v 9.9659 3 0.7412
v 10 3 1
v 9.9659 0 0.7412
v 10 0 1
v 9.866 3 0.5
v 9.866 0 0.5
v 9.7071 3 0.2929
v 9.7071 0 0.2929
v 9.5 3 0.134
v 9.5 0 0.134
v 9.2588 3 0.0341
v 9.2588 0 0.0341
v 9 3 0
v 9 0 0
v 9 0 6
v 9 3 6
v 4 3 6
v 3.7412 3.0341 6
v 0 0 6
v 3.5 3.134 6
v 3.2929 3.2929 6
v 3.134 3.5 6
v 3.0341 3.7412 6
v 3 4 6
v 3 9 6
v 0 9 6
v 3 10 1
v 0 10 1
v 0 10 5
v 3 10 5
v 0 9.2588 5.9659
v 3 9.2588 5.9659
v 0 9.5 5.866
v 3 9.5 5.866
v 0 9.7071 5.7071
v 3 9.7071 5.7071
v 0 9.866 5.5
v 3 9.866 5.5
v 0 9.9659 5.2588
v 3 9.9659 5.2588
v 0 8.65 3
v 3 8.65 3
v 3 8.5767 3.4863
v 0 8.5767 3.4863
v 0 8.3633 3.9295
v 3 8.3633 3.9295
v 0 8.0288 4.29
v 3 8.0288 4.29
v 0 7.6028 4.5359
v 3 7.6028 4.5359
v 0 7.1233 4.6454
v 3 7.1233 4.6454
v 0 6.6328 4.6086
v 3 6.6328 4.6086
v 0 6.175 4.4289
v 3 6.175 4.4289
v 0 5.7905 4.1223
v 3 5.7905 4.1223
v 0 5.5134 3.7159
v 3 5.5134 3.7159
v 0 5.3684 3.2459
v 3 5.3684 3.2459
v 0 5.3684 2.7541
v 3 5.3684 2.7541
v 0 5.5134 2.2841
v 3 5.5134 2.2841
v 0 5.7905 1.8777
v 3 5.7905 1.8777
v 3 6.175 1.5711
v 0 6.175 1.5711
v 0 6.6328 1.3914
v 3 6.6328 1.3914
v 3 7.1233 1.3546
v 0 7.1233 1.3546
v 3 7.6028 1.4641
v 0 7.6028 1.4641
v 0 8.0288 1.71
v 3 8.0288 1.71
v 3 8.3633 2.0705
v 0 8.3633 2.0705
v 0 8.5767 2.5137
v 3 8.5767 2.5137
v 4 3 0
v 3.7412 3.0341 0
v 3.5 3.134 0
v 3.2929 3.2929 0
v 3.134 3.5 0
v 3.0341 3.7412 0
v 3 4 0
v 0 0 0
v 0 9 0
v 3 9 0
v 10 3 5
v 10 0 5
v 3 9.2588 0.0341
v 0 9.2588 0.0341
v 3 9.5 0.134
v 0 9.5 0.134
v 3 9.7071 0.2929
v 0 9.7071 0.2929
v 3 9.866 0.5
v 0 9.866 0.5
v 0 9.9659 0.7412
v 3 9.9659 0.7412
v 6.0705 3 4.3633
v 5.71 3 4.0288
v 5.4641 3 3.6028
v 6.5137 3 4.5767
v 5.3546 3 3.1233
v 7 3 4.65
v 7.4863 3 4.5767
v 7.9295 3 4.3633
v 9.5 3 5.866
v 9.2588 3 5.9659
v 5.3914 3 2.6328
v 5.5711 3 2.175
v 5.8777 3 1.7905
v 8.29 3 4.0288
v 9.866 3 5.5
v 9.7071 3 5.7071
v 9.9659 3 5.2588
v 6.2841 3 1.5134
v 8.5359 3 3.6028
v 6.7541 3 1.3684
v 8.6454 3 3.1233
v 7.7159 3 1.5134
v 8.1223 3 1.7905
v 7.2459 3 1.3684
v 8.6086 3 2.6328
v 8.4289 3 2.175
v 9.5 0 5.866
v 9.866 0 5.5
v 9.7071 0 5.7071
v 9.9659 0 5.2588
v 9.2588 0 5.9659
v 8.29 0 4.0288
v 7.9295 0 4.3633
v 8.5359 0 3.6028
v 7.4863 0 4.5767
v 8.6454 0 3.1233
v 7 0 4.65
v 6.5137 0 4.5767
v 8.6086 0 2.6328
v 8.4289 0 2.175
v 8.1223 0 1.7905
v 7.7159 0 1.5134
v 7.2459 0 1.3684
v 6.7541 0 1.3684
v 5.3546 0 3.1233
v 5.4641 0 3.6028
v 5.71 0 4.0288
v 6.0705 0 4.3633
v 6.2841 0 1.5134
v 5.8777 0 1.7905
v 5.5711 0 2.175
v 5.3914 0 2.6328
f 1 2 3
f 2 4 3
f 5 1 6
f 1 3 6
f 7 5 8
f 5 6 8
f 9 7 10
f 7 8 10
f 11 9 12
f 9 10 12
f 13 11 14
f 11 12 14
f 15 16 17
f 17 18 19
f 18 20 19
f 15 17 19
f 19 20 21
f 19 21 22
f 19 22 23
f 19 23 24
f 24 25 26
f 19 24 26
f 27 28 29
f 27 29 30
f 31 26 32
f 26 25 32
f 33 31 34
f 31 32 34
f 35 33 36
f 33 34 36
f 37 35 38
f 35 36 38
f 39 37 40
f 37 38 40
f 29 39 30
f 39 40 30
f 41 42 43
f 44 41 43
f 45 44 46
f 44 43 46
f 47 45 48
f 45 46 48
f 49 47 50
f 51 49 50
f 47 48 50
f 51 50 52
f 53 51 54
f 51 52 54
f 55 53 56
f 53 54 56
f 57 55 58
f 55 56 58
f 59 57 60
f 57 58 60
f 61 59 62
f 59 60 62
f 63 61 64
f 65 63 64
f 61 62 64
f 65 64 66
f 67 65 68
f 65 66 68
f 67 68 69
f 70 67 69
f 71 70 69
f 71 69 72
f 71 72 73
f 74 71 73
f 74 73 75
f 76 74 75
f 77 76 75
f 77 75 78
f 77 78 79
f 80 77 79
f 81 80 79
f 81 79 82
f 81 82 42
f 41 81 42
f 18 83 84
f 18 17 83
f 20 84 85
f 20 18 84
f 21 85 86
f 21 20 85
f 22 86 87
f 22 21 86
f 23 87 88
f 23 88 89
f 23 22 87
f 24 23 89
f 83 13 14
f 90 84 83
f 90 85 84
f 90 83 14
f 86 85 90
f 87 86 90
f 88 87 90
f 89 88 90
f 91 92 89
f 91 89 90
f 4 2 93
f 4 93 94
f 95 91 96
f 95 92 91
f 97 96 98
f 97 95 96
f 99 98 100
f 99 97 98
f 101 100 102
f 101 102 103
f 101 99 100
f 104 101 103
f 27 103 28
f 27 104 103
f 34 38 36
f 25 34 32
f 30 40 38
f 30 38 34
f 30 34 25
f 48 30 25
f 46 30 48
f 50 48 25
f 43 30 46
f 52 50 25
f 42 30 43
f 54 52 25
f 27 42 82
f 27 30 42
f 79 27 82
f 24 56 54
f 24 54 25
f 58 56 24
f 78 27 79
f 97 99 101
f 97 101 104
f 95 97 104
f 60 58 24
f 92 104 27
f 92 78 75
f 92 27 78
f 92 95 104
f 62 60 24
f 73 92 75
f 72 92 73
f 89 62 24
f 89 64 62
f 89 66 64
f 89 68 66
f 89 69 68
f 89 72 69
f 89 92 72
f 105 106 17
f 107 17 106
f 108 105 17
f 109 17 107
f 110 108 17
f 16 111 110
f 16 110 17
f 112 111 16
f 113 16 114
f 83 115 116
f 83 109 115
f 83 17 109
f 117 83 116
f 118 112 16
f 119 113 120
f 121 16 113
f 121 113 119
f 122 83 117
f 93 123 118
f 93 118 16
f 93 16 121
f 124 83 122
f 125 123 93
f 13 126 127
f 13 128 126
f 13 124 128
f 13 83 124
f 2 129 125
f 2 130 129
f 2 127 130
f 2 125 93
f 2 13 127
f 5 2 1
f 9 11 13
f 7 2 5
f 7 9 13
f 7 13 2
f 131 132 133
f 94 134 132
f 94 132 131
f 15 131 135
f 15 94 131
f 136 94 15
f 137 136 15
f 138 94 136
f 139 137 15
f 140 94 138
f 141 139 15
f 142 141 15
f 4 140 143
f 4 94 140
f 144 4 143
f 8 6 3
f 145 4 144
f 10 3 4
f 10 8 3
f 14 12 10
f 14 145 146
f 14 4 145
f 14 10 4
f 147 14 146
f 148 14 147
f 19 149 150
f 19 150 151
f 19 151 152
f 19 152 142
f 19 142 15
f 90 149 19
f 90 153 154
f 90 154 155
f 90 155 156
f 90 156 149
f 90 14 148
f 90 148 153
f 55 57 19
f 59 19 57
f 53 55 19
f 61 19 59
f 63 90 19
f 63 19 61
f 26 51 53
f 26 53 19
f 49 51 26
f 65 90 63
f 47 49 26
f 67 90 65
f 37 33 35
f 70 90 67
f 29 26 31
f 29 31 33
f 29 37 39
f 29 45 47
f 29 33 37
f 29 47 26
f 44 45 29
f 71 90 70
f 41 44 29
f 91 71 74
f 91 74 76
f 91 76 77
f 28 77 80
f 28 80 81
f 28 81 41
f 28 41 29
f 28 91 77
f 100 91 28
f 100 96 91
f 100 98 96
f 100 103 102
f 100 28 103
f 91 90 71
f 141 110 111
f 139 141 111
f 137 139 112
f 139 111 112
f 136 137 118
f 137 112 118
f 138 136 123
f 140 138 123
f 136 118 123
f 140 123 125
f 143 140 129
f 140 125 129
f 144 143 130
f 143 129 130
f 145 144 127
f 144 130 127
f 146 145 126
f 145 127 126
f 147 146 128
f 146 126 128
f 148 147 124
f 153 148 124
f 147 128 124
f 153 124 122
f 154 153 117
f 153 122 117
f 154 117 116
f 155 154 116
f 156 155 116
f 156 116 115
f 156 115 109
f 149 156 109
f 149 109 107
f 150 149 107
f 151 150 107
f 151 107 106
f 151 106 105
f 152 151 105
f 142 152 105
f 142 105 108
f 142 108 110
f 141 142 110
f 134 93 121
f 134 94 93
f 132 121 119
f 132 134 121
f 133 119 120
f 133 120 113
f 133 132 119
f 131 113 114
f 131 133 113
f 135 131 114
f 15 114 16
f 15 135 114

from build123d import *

# Parameters (mm, degrees)
EXTRUDE_1_DEPTH     = 6
SKETCH_2_R          = 1.65
CUT_EXTRUDE_1_DEPTH = 6
SKETCH_3_R          = 1.65
CUT_EXTRUDE_2_DEPTH = 6
FILLET_1_R          = 1


with BuildPart() as part:
    # 草图1 → 凸台-拉伸1 (new body)
    with BuildSketch(Plane.XY):
        Polygon((10, 0), (0, 0), (0, 10), (3, 10), (3, 3), (10, 3), align=None)
    extrude(amount=EXTRUDE_1_DEPTH)

    # 草图2 → 切除-拉伸1 (cut)
    with BuildSketch(Plane(origin=(3, 0, 0), x_dir=(0, 0, -1), z_dir=(1, 0, 0))):
        with Locations(Location((-3, 7, 0), (0, 0, 90))):
            Circle(SKETCH_2_R)
    extrude(amount=-CUT_EXTRUDE_1_DEPTH, mode=Mode.SUBTRACT)

    # 草图3 → 切除-拉伸2 (cut)
    with BuildSketch(Plane(origin=(0, 3, 0), x_dir=(1, 0, 0), z_dir=(0, 1, 0))):
        with Locations(Location((7, -3, 0), (0, 0, 270))):
            Circle(SKETCH_3_R)
    extrude(amount=-CUT_EXTRUDE_2_DEPTH, mode=Mode.SUBTRACT)

    # 圆角1
    fillet_1_edges = [part.edges().sort_by_distance(p)[0] for p in [
        (3, 3, 3),
        (1.5, 10, 6),
        (10, 1.5, 6),
        (1.5, 10, 0),
        (10, 1.5, 0),
    ]]
    fillet(fillet_1_edges, radius=FILLET_1_R)


solid = part.part
